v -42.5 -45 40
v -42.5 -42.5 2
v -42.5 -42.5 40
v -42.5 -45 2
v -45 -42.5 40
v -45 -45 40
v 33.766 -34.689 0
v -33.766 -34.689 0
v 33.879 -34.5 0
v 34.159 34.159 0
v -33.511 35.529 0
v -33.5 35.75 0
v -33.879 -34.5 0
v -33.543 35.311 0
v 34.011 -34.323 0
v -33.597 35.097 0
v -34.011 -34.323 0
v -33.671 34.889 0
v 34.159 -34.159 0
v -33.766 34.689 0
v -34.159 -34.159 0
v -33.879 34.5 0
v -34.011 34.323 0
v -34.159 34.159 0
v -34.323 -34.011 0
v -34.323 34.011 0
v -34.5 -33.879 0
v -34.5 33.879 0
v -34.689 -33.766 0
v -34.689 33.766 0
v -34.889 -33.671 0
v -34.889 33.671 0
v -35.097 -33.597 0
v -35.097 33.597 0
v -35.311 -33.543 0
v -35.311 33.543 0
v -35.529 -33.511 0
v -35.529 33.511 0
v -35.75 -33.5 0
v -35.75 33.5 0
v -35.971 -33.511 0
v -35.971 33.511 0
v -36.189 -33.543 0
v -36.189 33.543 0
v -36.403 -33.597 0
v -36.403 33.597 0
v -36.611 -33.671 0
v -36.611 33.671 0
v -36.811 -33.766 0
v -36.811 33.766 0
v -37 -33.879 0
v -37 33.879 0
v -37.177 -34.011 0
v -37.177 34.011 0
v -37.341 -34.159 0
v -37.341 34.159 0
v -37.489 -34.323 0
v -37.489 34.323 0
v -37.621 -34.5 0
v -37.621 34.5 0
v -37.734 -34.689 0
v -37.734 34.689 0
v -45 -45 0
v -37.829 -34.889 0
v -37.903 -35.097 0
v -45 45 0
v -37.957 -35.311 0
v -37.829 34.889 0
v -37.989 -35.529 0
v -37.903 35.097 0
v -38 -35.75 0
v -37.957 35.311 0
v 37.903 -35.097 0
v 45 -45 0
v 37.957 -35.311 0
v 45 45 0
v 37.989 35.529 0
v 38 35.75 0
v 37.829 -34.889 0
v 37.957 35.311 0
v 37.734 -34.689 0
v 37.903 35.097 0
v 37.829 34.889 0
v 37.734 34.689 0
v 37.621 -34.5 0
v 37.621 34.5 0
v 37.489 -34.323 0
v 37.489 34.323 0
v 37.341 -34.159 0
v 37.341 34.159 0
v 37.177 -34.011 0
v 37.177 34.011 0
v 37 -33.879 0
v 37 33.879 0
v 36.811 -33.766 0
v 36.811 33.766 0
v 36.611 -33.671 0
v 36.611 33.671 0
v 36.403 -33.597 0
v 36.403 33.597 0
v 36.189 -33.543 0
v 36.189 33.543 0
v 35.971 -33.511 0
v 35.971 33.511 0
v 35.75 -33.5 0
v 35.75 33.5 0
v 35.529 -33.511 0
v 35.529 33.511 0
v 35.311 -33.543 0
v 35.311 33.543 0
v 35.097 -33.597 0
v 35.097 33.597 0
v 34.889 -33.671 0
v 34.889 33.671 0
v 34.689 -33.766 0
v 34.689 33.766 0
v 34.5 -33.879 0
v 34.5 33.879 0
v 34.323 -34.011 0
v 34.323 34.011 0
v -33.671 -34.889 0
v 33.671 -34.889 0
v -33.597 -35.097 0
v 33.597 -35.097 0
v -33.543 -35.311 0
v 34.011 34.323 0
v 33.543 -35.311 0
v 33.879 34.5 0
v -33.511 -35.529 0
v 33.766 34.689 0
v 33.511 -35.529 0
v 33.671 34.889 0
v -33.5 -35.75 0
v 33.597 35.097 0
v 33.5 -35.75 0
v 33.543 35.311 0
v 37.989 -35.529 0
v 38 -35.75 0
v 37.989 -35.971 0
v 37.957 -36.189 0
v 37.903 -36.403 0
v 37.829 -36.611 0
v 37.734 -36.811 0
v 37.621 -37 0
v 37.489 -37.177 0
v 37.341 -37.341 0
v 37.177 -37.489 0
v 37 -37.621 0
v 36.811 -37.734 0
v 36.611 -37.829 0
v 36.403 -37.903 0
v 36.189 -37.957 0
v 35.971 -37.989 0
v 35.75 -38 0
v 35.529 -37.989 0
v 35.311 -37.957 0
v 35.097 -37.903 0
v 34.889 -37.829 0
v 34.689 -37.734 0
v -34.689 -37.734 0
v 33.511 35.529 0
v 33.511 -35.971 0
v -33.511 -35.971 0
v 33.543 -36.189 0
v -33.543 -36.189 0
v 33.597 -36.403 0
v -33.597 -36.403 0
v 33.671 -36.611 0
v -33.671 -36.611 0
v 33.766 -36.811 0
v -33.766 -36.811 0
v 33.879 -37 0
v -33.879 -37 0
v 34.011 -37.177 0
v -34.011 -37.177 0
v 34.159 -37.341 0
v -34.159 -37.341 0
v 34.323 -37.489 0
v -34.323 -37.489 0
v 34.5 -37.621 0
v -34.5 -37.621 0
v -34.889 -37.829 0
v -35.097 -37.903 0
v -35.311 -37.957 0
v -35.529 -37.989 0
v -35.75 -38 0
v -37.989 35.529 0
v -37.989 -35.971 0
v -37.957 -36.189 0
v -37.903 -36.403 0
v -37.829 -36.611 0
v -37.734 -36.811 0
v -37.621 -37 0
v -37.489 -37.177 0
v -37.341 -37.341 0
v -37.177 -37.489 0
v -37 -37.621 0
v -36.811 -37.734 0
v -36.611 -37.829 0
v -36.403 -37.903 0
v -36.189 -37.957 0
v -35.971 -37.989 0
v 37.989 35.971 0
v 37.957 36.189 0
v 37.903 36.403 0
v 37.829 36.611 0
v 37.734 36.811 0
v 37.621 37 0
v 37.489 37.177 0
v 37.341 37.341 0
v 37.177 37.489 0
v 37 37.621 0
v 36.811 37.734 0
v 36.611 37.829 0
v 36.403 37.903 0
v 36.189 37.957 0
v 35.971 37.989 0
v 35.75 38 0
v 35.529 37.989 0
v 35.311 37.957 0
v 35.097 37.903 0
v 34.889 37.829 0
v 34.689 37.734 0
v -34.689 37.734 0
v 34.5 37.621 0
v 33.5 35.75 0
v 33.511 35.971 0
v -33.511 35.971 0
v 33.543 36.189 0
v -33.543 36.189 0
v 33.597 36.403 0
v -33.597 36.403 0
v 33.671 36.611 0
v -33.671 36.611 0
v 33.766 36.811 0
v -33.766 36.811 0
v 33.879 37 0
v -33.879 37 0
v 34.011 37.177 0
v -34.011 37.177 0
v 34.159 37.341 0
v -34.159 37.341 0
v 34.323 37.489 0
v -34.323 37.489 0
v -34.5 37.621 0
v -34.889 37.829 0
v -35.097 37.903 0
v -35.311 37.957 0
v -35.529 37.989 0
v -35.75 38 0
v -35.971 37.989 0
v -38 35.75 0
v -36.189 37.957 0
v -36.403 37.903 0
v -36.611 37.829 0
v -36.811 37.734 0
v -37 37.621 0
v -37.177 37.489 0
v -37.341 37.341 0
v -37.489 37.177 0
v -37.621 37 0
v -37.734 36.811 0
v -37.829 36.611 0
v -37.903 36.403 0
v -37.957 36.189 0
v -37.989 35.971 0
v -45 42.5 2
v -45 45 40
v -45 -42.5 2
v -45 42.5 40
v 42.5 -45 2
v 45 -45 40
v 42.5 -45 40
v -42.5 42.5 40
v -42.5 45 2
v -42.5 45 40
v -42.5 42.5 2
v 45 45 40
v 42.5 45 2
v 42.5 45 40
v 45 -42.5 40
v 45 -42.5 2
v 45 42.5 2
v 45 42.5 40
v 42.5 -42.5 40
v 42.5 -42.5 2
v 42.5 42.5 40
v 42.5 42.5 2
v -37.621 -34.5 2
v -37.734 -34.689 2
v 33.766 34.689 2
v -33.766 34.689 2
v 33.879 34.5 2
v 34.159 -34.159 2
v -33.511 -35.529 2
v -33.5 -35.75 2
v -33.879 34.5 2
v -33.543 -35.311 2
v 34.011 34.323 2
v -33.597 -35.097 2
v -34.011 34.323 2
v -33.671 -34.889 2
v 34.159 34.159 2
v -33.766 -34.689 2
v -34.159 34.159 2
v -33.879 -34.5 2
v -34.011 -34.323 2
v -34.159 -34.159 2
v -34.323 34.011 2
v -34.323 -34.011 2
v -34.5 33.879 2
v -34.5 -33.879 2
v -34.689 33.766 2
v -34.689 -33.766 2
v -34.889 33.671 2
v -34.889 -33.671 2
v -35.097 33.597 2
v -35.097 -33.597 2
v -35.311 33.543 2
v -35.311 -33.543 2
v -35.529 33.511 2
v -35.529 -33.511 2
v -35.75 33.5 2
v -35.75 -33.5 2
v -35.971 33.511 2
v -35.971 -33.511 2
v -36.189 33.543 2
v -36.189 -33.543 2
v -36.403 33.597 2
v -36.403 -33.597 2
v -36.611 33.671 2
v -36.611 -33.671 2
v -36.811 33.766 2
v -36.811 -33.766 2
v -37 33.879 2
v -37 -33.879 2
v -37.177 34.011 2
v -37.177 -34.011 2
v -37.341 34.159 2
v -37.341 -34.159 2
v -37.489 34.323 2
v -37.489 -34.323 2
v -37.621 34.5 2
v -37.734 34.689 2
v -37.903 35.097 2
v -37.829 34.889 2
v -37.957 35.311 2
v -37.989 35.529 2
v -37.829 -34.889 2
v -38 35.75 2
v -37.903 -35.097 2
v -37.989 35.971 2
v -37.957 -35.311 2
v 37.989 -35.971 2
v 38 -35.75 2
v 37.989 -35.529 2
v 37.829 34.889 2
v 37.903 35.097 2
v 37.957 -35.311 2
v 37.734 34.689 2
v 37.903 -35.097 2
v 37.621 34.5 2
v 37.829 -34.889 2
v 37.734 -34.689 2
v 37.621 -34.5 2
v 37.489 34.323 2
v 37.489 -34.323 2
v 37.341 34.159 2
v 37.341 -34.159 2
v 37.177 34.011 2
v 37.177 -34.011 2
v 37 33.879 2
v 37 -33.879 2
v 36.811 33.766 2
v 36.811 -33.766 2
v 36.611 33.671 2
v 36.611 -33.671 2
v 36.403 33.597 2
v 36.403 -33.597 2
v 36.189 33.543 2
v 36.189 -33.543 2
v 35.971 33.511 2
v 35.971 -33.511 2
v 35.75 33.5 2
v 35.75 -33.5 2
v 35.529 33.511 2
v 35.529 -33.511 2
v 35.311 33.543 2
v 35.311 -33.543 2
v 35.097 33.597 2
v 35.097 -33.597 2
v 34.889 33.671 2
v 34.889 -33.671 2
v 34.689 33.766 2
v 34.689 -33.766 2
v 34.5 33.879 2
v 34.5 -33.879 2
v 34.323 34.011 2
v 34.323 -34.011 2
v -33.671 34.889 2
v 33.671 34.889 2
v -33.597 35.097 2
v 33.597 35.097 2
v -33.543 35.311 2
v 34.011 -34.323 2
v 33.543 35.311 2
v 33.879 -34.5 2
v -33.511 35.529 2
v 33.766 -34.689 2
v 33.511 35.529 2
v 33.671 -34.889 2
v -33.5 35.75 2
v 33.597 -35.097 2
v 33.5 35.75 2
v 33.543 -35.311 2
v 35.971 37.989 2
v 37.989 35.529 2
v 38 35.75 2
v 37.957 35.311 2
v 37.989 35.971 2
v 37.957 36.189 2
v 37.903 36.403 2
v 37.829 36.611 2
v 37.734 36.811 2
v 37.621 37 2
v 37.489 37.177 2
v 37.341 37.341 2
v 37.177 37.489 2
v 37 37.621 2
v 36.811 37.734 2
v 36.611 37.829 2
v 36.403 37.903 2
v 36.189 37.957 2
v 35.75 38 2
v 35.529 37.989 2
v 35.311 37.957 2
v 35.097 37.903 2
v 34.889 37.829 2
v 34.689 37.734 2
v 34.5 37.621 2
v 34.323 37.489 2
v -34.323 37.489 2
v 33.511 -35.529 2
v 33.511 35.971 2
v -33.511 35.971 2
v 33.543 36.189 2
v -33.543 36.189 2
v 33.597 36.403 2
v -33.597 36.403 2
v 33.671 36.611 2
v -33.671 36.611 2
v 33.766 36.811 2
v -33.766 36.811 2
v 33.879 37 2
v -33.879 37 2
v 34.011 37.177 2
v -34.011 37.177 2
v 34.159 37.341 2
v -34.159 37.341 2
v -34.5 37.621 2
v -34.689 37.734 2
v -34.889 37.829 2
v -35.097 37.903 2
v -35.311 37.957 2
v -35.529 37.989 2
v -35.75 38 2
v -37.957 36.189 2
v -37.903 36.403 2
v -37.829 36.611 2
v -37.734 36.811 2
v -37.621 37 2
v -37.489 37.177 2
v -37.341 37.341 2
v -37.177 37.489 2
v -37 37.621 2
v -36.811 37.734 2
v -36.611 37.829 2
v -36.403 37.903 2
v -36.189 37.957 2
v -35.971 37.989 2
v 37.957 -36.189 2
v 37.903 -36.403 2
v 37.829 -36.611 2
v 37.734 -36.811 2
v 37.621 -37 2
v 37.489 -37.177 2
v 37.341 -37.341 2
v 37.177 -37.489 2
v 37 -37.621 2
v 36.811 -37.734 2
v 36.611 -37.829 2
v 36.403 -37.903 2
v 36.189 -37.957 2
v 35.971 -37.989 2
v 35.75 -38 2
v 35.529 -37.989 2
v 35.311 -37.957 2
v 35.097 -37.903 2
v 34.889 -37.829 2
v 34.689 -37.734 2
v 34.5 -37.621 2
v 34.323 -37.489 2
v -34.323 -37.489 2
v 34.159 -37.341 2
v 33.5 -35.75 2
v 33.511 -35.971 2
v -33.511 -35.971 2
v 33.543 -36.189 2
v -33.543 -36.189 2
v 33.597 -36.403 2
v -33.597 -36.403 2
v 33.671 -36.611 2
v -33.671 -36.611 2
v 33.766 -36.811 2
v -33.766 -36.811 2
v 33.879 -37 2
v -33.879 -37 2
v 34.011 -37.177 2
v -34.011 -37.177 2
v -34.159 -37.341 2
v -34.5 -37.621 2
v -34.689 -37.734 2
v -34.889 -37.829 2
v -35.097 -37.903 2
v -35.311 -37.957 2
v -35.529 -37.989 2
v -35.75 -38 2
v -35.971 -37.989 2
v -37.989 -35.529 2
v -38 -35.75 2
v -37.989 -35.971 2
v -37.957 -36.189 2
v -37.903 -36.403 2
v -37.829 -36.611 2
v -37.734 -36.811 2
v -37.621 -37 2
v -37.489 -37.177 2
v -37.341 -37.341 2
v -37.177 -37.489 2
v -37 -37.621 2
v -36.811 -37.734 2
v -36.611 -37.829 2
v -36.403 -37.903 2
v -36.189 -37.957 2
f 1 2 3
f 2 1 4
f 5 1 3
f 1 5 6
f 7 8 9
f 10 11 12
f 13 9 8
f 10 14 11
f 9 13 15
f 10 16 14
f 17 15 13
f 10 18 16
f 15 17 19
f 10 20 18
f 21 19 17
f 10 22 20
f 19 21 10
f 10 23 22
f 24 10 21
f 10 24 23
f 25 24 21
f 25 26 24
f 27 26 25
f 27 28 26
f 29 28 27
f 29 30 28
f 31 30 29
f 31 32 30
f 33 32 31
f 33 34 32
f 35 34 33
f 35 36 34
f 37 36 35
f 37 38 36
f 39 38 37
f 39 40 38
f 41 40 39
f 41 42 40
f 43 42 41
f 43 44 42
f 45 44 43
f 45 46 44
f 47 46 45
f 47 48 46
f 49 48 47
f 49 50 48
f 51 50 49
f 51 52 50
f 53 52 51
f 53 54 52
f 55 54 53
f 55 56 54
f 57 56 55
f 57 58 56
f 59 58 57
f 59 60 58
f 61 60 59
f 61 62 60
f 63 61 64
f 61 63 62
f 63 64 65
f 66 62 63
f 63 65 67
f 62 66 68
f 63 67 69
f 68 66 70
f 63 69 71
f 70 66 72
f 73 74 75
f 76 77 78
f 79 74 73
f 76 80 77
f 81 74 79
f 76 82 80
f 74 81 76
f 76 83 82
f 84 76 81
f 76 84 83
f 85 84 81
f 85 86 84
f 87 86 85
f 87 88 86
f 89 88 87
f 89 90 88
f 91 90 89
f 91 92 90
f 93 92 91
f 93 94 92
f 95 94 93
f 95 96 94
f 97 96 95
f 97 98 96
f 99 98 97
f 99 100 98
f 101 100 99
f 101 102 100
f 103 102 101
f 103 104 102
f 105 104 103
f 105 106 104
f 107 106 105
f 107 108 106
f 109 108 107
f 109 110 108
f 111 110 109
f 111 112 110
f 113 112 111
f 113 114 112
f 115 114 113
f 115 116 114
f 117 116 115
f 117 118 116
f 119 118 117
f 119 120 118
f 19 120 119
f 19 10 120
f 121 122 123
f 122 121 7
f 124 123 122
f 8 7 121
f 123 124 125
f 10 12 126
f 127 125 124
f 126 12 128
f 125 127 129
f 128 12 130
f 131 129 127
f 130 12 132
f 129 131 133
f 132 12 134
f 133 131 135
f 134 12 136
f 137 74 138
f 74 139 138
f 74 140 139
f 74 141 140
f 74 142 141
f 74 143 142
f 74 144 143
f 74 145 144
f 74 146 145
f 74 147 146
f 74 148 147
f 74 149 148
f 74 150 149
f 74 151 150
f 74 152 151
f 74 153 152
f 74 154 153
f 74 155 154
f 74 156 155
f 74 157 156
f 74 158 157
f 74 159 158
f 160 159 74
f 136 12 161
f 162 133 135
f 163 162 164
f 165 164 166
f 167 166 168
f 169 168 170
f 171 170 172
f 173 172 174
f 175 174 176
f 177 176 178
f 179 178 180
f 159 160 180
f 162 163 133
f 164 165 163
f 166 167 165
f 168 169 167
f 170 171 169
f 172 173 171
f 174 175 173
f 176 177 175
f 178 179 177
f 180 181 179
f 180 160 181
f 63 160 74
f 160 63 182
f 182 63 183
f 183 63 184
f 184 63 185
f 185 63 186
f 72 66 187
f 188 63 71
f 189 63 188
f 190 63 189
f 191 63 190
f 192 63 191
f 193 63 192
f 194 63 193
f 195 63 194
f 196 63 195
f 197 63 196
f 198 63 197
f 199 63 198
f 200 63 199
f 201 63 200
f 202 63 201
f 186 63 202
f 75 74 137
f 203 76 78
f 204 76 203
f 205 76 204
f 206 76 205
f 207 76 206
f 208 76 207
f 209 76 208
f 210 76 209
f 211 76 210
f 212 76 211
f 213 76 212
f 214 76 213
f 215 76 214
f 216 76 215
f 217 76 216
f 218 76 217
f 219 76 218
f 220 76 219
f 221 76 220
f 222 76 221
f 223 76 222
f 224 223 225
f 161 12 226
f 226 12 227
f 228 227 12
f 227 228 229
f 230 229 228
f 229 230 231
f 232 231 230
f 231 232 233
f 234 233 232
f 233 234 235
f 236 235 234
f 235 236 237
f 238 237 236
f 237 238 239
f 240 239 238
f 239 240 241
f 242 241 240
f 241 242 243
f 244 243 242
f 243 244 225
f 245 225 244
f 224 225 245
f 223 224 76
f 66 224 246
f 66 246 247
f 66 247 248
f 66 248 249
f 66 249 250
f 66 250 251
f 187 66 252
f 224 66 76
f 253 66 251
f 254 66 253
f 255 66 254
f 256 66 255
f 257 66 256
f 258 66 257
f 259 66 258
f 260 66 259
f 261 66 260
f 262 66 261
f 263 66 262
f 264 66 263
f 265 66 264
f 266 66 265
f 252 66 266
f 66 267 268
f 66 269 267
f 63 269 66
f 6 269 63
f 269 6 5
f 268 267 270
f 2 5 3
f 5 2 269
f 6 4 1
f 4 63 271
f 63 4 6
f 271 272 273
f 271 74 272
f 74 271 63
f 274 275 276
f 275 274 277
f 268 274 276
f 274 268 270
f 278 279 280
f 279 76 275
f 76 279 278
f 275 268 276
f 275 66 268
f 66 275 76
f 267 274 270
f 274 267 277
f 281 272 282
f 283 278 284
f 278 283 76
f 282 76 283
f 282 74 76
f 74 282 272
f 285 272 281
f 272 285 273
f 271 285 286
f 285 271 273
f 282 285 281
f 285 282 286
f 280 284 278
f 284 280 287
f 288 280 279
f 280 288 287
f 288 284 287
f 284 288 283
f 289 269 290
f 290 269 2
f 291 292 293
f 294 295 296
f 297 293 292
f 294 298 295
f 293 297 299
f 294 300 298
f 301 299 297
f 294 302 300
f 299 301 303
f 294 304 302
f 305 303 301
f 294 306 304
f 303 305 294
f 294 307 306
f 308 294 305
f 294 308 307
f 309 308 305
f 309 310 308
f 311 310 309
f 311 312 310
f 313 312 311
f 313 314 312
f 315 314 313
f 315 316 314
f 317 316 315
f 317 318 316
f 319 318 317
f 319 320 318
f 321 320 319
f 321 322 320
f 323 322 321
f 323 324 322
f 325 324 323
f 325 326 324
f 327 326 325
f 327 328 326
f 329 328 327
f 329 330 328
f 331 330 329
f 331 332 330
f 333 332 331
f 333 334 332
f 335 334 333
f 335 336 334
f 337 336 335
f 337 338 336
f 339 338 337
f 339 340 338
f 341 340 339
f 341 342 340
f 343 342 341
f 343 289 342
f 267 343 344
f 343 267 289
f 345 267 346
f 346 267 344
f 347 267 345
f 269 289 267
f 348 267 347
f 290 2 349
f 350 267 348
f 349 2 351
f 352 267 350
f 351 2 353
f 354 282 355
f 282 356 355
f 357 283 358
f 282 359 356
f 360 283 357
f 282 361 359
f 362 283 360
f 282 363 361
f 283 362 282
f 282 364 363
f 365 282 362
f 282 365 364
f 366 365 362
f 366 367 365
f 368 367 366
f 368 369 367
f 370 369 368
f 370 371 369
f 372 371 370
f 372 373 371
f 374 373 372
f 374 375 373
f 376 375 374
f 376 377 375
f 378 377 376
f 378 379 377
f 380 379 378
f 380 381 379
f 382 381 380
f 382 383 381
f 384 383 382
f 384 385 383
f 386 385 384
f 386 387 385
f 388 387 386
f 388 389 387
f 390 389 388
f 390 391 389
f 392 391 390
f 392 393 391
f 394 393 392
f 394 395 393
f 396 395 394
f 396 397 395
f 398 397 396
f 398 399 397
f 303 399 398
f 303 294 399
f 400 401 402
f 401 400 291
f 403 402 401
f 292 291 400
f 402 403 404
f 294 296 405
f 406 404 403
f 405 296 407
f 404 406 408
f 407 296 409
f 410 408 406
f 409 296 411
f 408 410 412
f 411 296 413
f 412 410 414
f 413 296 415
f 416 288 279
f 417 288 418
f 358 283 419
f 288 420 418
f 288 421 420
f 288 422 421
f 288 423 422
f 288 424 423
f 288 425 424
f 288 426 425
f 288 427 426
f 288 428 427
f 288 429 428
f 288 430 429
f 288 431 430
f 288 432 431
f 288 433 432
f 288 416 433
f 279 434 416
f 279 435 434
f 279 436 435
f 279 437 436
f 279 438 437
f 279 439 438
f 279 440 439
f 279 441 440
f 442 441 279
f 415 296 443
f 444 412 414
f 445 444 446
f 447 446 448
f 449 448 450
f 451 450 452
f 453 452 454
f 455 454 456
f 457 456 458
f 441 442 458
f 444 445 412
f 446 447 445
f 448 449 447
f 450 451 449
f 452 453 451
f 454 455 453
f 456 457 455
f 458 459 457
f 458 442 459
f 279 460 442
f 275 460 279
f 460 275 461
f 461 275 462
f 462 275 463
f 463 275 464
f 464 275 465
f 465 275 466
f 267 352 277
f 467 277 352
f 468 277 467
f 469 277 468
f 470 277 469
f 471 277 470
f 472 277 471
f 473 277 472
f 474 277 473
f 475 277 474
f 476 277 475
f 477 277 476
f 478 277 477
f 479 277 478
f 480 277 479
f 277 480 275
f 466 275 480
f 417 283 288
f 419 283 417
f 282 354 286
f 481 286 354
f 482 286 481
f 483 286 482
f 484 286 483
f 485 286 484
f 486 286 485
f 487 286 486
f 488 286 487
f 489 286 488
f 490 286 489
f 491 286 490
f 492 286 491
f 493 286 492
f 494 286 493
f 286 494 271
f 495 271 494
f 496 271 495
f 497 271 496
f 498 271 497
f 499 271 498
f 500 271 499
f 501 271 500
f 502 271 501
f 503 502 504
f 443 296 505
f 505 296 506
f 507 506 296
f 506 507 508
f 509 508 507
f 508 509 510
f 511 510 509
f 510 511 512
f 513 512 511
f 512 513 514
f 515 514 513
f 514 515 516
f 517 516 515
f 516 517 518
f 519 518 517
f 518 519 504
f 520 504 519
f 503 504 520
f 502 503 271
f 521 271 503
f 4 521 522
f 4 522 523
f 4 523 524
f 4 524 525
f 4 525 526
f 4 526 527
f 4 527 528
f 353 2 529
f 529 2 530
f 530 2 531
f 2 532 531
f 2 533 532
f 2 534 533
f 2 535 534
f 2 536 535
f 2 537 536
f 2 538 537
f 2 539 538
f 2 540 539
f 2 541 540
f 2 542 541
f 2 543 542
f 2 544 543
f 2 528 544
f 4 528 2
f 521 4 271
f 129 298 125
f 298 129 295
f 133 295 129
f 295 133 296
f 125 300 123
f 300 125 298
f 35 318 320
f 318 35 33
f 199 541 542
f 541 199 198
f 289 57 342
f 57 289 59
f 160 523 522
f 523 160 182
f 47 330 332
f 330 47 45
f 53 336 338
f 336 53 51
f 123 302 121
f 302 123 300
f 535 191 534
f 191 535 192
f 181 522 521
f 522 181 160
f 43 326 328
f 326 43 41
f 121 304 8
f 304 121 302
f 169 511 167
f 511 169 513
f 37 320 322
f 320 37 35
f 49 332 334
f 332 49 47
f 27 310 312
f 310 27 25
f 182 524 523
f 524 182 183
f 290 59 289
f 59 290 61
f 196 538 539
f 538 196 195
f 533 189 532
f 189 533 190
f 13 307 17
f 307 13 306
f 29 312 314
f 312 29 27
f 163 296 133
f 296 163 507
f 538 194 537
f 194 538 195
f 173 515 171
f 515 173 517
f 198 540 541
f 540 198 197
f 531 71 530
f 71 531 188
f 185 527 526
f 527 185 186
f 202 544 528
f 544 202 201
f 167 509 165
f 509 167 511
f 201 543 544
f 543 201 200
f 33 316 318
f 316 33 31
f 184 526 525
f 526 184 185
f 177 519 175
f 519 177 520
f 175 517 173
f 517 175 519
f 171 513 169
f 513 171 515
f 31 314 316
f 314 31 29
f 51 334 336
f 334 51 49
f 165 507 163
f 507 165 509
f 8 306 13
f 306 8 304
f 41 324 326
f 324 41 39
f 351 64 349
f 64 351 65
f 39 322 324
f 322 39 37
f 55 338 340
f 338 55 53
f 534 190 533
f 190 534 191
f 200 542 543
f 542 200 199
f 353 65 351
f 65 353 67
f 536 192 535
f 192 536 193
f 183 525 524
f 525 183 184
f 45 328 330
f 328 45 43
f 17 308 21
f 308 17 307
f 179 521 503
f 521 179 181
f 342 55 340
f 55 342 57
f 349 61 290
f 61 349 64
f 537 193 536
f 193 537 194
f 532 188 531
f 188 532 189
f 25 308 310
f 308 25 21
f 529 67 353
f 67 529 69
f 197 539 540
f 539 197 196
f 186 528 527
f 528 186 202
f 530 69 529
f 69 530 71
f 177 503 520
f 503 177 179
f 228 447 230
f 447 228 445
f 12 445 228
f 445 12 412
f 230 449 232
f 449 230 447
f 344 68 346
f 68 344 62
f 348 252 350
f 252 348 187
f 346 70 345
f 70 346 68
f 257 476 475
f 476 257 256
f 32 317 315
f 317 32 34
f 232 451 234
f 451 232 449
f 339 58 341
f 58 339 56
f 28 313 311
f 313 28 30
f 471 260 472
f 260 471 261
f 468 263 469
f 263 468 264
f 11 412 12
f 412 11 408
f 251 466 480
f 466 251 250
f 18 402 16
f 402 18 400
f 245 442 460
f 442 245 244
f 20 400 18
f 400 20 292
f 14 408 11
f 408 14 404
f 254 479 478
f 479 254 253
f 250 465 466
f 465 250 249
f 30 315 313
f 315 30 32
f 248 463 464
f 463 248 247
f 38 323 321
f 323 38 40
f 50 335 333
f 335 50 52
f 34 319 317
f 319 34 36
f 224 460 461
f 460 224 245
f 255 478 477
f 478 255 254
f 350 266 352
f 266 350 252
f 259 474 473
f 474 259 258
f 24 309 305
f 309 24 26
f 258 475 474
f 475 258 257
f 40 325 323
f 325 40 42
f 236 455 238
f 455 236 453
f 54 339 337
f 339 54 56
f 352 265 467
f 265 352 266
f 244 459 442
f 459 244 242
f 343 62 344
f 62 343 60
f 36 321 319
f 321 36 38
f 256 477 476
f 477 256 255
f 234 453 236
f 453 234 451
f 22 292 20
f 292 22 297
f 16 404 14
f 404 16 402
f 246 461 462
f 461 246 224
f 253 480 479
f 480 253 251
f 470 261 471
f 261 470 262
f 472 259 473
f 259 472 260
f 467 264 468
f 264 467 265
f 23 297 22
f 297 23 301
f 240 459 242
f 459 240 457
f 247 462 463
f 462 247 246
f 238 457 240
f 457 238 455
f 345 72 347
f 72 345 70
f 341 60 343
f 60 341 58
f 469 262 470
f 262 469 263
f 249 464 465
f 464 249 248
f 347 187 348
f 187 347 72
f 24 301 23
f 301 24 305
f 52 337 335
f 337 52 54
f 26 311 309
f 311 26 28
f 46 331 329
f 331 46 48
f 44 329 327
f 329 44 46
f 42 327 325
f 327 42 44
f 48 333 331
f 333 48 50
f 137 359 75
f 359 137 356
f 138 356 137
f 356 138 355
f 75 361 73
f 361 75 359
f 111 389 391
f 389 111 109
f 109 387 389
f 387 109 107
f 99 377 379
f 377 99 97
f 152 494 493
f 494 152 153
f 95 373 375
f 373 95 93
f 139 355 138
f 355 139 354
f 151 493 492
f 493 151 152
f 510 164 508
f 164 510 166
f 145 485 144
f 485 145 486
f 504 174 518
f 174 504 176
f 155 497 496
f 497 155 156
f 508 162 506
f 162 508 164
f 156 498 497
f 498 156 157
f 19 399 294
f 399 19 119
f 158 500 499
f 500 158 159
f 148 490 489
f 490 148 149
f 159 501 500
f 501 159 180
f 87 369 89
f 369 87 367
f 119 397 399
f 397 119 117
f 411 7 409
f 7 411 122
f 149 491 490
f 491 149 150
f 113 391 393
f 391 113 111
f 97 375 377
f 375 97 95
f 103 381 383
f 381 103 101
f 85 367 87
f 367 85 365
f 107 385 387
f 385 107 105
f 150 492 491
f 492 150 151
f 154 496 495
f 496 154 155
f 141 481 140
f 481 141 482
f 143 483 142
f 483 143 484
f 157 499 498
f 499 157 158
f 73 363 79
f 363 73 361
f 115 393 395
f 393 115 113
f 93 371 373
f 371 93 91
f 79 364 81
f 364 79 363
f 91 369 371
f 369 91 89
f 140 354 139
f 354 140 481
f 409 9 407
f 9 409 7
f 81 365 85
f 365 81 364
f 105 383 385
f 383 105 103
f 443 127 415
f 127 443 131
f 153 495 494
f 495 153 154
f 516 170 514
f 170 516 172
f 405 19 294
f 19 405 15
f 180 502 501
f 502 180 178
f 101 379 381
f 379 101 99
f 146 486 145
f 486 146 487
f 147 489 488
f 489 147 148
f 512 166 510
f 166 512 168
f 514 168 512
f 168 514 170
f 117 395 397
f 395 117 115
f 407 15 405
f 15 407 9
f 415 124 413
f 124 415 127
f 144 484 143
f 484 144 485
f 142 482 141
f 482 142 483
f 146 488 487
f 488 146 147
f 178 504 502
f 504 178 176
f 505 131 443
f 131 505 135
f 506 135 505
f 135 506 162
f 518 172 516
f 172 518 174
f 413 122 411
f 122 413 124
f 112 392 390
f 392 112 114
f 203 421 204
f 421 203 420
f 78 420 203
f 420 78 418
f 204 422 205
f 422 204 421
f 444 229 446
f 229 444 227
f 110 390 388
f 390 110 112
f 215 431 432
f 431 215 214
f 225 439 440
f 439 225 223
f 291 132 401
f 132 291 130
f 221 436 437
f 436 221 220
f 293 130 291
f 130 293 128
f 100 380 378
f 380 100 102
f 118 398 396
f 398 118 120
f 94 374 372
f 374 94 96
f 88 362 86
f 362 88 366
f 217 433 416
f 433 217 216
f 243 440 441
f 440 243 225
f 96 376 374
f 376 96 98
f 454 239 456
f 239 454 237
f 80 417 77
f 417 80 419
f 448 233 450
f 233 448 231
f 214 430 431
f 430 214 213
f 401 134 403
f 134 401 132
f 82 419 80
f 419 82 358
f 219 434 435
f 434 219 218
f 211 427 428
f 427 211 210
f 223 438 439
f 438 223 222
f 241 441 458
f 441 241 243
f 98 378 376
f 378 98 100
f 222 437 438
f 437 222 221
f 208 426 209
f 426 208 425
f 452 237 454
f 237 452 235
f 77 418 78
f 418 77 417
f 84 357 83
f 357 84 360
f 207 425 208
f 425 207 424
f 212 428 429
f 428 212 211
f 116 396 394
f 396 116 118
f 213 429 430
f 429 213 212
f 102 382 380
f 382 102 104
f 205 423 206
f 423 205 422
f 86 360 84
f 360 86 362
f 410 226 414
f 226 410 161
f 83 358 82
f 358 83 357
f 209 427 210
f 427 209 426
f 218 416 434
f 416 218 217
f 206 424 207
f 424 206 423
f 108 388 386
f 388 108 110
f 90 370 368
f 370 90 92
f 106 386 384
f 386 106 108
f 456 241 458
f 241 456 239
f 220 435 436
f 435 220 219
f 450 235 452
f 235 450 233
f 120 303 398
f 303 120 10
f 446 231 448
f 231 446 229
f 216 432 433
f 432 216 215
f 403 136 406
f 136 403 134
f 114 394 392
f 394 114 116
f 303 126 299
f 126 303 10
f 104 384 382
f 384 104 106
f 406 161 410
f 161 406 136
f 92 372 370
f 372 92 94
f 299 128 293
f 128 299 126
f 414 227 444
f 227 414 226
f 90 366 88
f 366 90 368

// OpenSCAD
// DIY magnetic stirrer housing for 80 mm PC case fan
// Print orientation: top plate on bed (z = 0), walls build upward (+Z)

$fn = 64;

// ---- Dimensions (mm) ----
plate_thickness   = 2;     // top plate thickness (z = 0 to 2)
wall_thickness    = 2.5;   // side wall thickness
box_height        = 40;    // outer wall height (top of walls at z = 40)
outer_size        = 90;    // outer length and width (X x Y)
hole_d            = 4.5;   // screw hole diameter (M4)
hole_pattern      = 71.5;  // square pitch of screw holes
notch_width       = 12;    // cable notch width
notch_depth       = 8;     // cable notch depth from open edge (z = 32 to 40)
notch_wall        = 2.5;   // cable notch in which wall (X+)
eps               = 0.5;   // overshoot for clean boolean cuts

// ---- Model ----
difference() {
    union() {
        // Top plate
        translate([-outer_size/2, -outer_size/2, 0])
            cube([outer_size, outer_size, plate_thickness]);

        // Four side walls, rising from plate to open top
        for (sx = [-1, 1], sy = [-1, 1])
            translate([sx > 0 ? outer_size/2 - wall_thickness : -outer_size/2,
                       sy > 0 ? outer_size/2 - wall_thickness : -outer_size/2,
                       0])
                cube([wall_thickness, wall_thickness, box_height]);
    }

    // Screw holes through top plate on centred square pattern
    for (x = [-hole_pattern/2, hole_pattern/2])
        for (y = [-hole_pattern/2, hole_pattern/2])
            translate([x, y, -eps])
                cylinder(d = hole_d, h = plate_thickness + 2*eps);

    // Cable notch in X+ wall, centred along the wall
    translate([outer_size/2 - notch_width/2, -notch_width/2, box_height - notch_depth])
        cube([notch_width, notch_width, notch_depth + eps]);
}
